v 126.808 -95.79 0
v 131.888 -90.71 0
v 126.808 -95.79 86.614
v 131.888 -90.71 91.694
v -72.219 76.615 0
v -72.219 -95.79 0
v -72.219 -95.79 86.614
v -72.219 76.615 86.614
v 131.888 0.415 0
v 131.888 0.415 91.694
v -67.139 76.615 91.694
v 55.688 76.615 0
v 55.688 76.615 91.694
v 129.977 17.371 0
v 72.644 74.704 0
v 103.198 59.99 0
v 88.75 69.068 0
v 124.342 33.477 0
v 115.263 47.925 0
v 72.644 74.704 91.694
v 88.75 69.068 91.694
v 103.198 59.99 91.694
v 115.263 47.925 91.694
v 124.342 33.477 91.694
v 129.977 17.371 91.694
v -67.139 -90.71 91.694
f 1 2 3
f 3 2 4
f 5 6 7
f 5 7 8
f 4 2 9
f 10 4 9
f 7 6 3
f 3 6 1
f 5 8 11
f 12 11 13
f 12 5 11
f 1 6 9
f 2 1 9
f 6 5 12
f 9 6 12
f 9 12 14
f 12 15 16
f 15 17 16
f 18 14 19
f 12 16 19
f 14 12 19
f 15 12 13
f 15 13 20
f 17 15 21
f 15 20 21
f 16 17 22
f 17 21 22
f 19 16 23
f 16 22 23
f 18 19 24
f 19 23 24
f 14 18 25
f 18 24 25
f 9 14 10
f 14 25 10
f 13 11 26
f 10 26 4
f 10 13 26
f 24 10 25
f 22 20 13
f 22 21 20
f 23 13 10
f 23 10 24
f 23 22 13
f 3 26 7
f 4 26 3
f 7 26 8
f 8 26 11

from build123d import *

# Parameters (mm, degrees)
F0_W     = 204.106725
F0_H     = 172.404602
F1_DEPTH = 91.694
F2_SIZE  = 5.08
F3_R     = 76.2


with BuildPart() as f1:
    # F0 (on Top) → F1 (new body)
    with BuildSketch(Plane.XY):
        with Locations((29.834312, -9.587683)):
            Rectangle(F0_W, F0_H)
    extrude(amount=F1_DEPTH)

    # F2
    f2_edges = [f1.edges().sort_by_distance(p)[0] for p in [
        (29.834311, -95.789984, 91.694),
        (-72.219051, -9.587683, 91.694),
        (131.887674, -95.789984, 45.847),
    ]]
    chamfer(f2_edges, length=F2_SIZE)

    # F3
    f3_edges = [f1.edges().sort_by_distance(p)[0] for p in [
        (131.887674, 76.614618, 45.847),
    ]]
    fillet(f3_edges, radius=F3_R)


solid = f1.part
